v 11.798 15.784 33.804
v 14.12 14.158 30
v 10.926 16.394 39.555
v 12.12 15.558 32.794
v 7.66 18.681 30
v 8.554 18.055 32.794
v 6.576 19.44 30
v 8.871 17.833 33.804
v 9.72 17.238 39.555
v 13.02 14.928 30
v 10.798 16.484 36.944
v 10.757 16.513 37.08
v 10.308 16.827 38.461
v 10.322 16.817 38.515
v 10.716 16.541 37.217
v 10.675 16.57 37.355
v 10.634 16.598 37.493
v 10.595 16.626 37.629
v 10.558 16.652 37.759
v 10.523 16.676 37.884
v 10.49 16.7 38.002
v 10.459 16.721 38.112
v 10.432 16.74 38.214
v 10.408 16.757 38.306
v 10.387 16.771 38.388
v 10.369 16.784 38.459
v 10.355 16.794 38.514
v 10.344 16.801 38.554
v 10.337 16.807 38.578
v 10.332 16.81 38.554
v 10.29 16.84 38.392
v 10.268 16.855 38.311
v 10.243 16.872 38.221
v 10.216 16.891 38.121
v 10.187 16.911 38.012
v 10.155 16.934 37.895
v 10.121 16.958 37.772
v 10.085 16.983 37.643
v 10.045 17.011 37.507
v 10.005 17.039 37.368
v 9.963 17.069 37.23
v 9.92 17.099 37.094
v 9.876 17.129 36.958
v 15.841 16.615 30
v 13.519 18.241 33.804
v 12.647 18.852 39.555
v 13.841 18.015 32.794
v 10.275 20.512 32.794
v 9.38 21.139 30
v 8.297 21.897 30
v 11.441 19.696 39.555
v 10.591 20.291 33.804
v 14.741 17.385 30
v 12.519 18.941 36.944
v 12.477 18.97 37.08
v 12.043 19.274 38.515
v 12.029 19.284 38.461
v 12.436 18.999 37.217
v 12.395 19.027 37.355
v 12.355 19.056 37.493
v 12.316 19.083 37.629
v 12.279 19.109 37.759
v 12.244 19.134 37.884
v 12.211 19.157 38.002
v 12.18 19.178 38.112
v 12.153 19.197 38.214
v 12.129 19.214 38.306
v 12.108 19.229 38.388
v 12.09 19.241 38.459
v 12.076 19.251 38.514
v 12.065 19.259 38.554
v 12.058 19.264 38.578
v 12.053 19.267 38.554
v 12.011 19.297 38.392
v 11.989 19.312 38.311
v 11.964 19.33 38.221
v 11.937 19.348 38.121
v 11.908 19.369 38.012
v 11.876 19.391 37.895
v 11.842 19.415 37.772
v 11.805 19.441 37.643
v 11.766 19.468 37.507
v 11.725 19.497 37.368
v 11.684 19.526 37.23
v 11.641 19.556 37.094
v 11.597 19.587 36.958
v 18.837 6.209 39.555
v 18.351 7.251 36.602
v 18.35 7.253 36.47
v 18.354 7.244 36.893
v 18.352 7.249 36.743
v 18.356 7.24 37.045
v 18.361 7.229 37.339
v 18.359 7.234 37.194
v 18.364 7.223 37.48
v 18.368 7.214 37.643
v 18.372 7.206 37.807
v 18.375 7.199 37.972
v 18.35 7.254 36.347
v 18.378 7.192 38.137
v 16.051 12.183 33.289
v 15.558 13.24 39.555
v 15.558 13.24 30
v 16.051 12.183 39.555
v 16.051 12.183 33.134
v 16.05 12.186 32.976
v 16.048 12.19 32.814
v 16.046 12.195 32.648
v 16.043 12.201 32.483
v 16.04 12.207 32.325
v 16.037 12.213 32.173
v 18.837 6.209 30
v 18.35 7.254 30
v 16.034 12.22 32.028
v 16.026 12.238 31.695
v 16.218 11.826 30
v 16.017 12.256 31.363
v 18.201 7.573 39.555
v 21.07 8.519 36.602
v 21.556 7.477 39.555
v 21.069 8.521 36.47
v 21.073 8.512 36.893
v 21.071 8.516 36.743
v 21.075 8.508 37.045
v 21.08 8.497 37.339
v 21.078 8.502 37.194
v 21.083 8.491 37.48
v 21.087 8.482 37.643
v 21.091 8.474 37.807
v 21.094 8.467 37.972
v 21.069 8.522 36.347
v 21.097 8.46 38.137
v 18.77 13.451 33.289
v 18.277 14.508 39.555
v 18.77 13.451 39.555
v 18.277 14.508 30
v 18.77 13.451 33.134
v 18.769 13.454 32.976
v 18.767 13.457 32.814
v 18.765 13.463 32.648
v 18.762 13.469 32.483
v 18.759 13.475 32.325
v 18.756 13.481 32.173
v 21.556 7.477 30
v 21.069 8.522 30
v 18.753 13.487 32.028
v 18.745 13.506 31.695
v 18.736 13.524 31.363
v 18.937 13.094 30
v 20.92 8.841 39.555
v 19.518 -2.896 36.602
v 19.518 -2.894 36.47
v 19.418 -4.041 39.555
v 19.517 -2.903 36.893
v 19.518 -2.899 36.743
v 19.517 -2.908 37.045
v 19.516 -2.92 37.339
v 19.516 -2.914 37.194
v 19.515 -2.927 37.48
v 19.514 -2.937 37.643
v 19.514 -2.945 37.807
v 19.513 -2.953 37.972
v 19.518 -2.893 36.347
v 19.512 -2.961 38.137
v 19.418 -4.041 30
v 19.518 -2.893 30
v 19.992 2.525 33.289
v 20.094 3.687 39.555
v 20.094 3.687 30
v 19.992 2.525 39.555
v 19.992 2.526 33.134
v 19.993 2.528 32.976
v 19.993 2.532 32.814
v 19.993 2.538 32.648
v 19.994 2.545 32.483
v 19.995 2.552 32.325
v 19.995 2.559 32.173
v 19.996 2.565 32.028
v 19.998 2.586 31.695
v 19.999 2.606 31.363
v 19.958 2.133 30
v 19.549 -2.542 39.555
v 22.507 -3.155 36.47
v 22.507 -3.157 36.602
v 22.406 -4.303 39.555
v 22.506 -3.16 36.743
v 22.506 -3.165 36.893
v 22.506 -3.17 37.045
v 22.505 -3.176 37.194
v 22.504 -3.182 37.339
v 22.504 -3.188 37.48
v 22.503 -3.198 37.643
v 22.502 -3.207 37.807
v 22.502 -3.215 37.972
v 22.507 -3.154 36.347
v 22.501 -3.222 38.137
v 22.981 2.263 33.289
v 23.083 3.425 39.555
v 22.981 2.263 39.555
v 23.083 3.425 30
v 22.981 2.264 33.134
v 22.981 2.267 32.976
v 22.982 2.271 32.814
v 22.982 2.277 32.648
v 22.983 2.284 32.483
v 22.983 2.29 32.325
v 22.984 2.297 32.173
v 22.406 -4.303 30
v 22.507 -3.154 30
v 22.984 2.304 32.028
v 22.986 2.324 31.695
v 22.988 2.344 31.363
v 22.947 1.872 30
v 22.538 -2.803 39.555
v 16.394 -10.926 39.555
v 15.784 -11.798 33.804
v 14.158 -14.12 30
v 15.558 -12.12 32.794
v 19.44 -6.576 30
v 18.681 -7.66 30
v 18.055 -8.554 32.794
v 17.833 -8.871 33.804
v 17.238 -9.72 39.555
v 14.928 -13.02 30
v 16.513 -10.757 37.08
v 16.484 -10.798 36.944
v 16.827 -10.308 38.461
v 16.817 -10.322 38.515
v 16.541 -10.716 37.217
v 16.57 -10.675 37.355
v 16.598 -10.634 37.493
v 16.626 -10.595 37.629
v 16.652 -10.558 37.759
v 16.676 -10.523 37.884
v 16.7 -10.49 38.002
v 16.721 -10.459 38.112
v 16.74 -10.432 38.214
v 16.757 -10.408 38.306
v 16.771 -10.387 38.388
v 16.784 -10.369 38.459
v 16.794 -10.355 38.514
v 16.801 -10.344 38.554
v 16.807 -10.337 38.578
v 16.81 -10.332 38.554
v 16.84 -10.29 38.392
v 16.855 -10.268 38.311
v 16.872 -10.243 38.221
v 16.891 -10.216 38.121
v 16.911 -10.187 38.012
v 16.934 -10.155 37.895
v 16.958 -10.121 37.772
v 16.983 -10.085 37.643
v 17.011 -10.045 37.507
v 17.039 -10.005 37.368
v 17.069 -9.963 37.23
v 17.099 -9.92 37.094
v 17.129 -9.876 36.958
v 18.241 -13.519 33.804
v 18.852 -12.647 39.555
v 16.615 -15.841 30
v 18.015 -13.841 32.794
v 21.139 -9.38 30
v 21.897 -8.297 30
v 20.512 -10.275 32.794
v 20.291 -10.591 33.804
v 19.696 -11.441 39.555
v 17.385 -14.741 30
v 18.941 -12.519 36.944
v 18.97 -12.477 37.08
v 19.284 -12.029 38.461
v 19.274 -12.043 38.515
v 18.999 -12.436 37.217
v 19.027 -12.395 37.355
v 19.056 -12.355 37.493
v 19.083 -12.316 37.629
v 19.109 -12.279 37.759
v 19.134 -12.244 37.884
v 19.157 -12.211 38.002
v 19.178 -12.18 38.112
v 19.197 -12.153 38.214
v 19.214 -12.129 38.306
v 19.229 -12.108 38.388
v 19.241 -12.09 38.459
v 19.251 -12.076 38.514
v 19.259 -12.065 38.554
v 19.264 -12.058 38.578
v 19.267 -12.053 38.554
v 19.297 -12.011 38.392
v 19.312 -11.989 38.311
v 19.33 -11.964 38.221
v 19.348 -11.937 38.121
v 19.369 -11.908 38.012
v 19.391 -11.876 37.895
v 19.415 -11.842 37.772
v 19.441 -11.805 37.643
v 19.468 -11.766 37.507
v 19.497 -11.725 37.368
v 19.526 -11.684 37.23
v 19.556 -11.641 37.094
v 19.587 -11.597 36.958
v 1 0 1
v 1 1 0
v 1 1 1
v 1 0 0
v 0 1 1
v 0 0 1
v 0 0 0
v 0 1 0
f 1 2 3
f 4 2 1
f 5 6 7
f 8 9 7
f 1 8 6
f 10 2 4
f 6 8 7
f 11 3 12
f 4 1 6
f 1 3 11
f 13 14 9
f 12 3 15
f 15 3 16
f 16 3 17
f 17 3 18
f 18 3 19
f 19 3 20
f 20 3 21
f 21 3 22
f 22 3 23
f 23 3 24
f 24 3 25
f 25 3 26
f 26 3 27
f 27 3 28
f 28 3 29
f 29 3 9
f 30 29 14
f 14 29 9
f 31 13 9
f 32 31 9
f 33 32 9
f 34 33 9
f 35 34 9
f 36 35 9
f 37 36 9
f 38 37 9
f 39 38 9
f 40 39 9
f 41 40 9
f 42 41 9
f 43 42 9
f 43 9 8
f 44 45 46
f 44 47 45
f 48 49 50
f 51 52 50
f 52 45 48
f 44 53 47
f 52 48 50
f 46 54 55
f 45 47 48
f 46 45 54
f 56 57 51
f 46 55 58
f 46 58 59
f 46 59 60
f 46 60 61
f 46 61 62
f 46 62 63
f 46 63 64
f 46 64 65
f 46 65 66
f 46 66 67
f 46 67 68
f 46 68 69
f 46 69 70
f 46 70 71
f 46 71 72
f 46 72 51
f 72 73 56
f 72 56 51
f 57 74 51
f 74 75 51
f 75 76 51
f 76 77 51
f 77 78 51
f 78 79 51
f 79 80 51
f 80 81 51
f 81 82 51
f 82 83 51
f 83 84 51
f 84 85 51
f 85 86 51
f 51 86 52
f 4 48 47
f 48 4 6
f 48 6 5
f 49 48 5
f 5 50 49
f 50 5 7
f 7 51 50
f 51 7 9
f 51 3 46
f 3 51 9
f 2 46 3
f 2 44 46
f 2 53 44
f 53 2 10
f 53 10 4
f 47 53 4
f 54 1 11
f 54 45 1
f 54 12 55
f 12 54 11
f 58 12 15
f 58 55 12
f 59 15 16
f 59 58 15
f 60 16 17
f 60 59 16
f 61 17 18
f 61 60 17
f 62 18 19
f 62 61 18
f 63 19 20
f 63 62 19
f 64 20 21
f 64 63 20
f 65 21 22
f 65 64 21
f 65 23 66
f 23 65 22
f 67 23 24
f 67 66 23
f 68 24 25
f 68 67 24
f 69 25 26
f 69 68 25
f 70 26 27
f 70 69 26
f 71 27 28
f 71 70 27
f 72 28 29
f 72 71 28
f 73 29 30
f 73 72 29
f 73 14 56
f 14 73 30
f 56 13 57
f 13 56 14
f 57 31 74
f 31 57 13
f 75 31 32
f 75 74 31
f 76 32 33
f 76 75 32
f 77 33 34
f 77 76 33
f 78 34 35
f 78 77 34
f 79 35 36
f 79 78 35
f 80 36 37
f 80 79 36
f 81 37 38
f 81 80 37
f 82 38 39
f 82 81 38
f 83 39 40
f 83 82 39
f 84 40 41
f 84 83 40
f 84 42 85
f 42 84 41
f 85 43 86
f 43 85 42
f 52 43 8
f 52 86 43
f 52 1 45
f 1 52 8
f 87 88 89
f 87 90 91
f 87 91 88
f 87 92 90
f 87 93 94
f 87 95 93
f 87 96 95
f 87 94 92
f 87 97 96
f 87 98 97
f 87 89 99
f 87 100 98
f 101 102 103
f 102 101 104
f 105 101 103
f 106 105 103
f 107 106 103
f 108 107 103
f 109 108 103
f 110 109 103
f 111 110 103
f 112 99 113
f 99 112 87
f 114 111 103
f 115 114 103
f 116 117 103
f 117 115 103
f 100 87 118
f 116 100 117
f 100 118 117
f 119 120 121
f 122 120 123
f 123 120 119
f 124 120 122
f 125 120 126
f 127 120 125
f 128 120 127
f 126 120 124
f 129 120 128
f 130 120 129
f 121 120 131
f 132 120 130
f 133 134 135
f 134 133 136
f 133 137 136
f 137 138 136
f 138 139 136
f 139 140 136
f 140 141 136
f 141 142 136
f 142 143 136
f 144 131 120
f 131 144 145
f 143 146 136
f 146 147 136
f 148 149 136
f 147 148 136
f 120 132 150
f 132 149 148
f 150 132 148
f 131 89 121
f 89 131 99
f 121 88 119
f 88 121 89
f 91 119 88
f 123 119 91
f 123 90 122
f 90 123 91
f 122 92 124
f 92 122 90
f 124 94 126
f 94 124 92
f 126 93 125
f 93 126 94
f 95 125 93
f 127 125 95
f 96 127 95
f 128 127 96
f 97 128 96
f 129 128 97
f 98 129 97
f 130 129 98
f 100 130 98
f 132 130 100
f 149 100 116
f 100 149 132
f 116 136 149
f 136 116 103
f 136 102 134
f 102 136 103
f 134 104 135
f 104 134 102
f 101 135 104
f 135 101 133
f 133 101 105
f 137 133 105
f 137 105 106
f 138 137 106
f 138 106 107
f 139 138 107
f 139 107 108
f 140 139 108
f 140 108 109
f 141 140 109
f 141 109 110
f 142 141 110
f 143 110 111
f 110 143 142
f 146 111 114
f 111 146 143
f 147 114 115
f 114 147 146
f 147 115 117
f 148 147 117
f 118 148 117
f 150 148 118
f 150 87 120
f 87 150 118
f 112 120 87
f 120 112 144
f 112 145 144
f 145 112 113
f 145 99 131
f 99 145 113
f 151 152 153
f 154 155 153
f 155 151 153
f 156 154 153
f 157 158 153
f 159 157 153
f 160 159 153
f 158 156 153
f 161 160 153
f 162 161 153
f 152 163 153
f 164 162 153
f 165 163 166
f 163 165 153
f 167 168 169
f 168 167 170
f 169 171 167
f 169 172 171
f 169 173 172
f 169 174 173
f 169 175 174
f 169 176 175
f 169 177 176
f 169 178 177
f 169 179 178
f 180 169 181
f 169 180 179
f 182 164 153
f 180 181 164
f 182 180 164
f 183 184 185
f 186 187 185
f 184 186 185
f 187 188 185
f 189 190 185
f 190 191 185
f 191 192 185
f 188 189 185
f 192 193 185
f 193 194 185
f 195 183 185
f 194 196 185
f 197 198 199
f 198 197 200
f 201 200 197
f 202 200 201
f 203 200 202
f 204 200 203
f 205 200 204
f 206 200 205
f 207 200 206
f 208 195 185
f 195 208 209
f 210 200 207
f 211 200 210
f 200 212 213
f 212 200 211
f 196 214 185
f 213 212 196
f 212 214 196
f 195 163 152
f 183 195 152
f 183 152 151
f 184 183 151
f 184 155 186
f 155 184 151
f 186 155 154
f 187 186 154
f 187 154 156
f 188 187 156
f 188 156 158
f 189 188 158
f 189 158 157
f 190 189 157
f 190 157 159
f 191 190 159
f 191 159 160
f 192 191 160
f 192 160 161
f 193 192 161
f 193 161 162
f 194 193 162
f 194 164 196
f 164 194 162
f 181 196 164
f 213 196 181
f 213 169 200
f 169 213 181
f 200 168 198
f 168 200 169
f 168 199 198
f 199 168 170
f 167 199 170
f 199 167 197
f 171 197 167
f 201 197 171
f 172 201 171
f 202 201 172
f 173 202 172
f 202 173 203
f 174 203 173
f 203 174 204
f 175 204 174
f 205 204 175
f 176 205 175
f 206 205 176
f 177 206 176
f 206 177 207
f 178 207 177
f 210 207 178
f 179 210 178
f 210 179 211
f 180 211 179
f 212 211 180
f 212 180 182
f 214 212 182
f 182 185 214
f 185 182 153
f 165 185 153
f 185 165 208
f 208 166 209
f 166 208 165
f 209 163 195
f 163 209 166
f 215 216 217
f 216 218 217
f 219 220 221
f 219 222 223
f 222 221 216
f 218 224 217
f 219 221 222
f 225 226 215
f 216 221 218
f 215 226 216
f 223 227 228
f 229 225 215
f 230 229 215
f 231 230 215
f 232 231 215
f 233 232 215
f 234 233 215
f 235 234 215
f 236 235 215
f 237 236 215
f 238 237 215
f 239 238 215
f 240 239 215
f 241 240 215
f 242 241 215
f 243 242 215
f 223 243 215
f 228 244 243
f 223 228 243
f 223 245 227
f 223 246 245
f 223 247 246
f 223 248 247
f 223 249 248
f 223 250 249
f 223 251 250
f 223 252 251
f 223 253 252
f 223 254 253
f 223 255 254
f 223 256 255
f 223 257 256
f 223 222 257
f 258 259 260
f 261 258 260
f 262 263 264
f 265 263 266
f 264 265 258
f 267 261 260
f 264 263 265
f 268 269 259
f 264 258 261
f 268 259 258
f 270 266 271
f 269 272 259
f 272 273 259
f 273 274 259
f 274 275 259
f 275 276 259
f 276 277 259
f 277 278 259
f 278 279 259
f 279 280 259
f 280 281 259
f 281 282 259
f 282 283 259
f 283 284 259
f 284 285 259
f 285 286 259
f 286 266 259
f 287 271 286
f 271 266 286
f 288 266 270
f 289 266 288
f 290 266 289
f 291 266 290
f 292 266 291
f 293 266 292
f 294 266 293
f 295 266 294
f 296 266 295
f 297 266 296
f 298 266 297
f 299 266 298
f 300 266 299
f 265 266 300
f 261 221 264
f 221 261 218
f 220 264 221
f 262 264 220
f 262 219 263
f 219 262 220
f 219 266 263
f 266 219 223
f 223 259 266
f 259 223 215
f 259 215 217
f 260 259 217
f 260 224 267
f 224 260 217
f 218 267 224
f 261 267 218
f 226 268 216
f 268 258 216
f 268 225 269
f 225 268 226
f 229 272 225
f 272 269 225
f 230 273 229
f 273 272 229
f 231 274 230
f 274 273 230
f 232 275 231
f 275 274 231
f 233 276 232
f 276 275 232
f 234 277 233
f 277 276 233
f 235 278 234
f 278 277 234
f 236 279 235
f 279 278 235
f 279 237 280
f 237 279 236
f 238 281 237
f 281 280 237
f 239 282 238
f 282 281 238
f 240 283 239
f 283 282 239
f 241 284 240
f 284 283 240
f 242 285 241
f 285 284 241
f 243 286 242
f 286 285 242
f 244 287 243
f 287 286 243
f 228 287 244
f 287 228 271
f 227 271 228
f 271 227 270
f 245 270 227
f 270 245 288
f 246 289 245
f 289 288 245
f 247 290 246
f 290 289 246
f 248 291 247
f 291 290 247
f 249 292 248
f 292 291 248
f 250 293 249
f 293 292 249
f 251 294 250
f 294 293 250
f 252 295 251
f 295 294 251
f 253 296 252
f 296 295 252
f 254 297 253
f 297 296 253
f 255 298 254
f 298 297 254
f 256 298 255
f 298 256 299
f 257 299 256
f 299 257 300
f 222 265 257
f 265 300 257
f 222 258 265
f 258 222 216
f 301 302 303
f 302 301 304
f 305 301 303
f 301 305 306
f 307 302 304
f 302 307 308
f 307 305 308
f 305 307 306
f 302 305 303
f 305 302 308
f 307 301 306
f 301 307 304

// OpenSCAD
cube(1);
translate([0,0,30])
{
a(d=20,a=45,t="A");
a(d=20,a=15,t="N");
a(d=20,a=-15,t="N");
a(d=20,a=-45,t="A");
}
//rotate([0,0,-5])
//a();
//rotate([0,0,5])
//a();
//rotate([0,0,15])
//a();

//{
//    rotate([90,0,-40])
//    translate([-15,10,0])
//
//    rotate([90,0,-20])
//    translate([-5,10,0])
//    linear_extrude(height=3)
//        text("N");
//    rotate([90,0,0])
//    translate([5,10,0])
//    linear_extrude(height=3)
//        text("N");
//    rotate([90,0,0])
//    translate([15,10,0])
//    linear_extrude(height=3)
//        text("A");
//}

module a(d=1,a=0,t=""){ 
   rotate([0,0,a])
   translate([d,0,0])
   rotate([90,0,100])
   linear_extrude(height=3)
   text(t); 
}
